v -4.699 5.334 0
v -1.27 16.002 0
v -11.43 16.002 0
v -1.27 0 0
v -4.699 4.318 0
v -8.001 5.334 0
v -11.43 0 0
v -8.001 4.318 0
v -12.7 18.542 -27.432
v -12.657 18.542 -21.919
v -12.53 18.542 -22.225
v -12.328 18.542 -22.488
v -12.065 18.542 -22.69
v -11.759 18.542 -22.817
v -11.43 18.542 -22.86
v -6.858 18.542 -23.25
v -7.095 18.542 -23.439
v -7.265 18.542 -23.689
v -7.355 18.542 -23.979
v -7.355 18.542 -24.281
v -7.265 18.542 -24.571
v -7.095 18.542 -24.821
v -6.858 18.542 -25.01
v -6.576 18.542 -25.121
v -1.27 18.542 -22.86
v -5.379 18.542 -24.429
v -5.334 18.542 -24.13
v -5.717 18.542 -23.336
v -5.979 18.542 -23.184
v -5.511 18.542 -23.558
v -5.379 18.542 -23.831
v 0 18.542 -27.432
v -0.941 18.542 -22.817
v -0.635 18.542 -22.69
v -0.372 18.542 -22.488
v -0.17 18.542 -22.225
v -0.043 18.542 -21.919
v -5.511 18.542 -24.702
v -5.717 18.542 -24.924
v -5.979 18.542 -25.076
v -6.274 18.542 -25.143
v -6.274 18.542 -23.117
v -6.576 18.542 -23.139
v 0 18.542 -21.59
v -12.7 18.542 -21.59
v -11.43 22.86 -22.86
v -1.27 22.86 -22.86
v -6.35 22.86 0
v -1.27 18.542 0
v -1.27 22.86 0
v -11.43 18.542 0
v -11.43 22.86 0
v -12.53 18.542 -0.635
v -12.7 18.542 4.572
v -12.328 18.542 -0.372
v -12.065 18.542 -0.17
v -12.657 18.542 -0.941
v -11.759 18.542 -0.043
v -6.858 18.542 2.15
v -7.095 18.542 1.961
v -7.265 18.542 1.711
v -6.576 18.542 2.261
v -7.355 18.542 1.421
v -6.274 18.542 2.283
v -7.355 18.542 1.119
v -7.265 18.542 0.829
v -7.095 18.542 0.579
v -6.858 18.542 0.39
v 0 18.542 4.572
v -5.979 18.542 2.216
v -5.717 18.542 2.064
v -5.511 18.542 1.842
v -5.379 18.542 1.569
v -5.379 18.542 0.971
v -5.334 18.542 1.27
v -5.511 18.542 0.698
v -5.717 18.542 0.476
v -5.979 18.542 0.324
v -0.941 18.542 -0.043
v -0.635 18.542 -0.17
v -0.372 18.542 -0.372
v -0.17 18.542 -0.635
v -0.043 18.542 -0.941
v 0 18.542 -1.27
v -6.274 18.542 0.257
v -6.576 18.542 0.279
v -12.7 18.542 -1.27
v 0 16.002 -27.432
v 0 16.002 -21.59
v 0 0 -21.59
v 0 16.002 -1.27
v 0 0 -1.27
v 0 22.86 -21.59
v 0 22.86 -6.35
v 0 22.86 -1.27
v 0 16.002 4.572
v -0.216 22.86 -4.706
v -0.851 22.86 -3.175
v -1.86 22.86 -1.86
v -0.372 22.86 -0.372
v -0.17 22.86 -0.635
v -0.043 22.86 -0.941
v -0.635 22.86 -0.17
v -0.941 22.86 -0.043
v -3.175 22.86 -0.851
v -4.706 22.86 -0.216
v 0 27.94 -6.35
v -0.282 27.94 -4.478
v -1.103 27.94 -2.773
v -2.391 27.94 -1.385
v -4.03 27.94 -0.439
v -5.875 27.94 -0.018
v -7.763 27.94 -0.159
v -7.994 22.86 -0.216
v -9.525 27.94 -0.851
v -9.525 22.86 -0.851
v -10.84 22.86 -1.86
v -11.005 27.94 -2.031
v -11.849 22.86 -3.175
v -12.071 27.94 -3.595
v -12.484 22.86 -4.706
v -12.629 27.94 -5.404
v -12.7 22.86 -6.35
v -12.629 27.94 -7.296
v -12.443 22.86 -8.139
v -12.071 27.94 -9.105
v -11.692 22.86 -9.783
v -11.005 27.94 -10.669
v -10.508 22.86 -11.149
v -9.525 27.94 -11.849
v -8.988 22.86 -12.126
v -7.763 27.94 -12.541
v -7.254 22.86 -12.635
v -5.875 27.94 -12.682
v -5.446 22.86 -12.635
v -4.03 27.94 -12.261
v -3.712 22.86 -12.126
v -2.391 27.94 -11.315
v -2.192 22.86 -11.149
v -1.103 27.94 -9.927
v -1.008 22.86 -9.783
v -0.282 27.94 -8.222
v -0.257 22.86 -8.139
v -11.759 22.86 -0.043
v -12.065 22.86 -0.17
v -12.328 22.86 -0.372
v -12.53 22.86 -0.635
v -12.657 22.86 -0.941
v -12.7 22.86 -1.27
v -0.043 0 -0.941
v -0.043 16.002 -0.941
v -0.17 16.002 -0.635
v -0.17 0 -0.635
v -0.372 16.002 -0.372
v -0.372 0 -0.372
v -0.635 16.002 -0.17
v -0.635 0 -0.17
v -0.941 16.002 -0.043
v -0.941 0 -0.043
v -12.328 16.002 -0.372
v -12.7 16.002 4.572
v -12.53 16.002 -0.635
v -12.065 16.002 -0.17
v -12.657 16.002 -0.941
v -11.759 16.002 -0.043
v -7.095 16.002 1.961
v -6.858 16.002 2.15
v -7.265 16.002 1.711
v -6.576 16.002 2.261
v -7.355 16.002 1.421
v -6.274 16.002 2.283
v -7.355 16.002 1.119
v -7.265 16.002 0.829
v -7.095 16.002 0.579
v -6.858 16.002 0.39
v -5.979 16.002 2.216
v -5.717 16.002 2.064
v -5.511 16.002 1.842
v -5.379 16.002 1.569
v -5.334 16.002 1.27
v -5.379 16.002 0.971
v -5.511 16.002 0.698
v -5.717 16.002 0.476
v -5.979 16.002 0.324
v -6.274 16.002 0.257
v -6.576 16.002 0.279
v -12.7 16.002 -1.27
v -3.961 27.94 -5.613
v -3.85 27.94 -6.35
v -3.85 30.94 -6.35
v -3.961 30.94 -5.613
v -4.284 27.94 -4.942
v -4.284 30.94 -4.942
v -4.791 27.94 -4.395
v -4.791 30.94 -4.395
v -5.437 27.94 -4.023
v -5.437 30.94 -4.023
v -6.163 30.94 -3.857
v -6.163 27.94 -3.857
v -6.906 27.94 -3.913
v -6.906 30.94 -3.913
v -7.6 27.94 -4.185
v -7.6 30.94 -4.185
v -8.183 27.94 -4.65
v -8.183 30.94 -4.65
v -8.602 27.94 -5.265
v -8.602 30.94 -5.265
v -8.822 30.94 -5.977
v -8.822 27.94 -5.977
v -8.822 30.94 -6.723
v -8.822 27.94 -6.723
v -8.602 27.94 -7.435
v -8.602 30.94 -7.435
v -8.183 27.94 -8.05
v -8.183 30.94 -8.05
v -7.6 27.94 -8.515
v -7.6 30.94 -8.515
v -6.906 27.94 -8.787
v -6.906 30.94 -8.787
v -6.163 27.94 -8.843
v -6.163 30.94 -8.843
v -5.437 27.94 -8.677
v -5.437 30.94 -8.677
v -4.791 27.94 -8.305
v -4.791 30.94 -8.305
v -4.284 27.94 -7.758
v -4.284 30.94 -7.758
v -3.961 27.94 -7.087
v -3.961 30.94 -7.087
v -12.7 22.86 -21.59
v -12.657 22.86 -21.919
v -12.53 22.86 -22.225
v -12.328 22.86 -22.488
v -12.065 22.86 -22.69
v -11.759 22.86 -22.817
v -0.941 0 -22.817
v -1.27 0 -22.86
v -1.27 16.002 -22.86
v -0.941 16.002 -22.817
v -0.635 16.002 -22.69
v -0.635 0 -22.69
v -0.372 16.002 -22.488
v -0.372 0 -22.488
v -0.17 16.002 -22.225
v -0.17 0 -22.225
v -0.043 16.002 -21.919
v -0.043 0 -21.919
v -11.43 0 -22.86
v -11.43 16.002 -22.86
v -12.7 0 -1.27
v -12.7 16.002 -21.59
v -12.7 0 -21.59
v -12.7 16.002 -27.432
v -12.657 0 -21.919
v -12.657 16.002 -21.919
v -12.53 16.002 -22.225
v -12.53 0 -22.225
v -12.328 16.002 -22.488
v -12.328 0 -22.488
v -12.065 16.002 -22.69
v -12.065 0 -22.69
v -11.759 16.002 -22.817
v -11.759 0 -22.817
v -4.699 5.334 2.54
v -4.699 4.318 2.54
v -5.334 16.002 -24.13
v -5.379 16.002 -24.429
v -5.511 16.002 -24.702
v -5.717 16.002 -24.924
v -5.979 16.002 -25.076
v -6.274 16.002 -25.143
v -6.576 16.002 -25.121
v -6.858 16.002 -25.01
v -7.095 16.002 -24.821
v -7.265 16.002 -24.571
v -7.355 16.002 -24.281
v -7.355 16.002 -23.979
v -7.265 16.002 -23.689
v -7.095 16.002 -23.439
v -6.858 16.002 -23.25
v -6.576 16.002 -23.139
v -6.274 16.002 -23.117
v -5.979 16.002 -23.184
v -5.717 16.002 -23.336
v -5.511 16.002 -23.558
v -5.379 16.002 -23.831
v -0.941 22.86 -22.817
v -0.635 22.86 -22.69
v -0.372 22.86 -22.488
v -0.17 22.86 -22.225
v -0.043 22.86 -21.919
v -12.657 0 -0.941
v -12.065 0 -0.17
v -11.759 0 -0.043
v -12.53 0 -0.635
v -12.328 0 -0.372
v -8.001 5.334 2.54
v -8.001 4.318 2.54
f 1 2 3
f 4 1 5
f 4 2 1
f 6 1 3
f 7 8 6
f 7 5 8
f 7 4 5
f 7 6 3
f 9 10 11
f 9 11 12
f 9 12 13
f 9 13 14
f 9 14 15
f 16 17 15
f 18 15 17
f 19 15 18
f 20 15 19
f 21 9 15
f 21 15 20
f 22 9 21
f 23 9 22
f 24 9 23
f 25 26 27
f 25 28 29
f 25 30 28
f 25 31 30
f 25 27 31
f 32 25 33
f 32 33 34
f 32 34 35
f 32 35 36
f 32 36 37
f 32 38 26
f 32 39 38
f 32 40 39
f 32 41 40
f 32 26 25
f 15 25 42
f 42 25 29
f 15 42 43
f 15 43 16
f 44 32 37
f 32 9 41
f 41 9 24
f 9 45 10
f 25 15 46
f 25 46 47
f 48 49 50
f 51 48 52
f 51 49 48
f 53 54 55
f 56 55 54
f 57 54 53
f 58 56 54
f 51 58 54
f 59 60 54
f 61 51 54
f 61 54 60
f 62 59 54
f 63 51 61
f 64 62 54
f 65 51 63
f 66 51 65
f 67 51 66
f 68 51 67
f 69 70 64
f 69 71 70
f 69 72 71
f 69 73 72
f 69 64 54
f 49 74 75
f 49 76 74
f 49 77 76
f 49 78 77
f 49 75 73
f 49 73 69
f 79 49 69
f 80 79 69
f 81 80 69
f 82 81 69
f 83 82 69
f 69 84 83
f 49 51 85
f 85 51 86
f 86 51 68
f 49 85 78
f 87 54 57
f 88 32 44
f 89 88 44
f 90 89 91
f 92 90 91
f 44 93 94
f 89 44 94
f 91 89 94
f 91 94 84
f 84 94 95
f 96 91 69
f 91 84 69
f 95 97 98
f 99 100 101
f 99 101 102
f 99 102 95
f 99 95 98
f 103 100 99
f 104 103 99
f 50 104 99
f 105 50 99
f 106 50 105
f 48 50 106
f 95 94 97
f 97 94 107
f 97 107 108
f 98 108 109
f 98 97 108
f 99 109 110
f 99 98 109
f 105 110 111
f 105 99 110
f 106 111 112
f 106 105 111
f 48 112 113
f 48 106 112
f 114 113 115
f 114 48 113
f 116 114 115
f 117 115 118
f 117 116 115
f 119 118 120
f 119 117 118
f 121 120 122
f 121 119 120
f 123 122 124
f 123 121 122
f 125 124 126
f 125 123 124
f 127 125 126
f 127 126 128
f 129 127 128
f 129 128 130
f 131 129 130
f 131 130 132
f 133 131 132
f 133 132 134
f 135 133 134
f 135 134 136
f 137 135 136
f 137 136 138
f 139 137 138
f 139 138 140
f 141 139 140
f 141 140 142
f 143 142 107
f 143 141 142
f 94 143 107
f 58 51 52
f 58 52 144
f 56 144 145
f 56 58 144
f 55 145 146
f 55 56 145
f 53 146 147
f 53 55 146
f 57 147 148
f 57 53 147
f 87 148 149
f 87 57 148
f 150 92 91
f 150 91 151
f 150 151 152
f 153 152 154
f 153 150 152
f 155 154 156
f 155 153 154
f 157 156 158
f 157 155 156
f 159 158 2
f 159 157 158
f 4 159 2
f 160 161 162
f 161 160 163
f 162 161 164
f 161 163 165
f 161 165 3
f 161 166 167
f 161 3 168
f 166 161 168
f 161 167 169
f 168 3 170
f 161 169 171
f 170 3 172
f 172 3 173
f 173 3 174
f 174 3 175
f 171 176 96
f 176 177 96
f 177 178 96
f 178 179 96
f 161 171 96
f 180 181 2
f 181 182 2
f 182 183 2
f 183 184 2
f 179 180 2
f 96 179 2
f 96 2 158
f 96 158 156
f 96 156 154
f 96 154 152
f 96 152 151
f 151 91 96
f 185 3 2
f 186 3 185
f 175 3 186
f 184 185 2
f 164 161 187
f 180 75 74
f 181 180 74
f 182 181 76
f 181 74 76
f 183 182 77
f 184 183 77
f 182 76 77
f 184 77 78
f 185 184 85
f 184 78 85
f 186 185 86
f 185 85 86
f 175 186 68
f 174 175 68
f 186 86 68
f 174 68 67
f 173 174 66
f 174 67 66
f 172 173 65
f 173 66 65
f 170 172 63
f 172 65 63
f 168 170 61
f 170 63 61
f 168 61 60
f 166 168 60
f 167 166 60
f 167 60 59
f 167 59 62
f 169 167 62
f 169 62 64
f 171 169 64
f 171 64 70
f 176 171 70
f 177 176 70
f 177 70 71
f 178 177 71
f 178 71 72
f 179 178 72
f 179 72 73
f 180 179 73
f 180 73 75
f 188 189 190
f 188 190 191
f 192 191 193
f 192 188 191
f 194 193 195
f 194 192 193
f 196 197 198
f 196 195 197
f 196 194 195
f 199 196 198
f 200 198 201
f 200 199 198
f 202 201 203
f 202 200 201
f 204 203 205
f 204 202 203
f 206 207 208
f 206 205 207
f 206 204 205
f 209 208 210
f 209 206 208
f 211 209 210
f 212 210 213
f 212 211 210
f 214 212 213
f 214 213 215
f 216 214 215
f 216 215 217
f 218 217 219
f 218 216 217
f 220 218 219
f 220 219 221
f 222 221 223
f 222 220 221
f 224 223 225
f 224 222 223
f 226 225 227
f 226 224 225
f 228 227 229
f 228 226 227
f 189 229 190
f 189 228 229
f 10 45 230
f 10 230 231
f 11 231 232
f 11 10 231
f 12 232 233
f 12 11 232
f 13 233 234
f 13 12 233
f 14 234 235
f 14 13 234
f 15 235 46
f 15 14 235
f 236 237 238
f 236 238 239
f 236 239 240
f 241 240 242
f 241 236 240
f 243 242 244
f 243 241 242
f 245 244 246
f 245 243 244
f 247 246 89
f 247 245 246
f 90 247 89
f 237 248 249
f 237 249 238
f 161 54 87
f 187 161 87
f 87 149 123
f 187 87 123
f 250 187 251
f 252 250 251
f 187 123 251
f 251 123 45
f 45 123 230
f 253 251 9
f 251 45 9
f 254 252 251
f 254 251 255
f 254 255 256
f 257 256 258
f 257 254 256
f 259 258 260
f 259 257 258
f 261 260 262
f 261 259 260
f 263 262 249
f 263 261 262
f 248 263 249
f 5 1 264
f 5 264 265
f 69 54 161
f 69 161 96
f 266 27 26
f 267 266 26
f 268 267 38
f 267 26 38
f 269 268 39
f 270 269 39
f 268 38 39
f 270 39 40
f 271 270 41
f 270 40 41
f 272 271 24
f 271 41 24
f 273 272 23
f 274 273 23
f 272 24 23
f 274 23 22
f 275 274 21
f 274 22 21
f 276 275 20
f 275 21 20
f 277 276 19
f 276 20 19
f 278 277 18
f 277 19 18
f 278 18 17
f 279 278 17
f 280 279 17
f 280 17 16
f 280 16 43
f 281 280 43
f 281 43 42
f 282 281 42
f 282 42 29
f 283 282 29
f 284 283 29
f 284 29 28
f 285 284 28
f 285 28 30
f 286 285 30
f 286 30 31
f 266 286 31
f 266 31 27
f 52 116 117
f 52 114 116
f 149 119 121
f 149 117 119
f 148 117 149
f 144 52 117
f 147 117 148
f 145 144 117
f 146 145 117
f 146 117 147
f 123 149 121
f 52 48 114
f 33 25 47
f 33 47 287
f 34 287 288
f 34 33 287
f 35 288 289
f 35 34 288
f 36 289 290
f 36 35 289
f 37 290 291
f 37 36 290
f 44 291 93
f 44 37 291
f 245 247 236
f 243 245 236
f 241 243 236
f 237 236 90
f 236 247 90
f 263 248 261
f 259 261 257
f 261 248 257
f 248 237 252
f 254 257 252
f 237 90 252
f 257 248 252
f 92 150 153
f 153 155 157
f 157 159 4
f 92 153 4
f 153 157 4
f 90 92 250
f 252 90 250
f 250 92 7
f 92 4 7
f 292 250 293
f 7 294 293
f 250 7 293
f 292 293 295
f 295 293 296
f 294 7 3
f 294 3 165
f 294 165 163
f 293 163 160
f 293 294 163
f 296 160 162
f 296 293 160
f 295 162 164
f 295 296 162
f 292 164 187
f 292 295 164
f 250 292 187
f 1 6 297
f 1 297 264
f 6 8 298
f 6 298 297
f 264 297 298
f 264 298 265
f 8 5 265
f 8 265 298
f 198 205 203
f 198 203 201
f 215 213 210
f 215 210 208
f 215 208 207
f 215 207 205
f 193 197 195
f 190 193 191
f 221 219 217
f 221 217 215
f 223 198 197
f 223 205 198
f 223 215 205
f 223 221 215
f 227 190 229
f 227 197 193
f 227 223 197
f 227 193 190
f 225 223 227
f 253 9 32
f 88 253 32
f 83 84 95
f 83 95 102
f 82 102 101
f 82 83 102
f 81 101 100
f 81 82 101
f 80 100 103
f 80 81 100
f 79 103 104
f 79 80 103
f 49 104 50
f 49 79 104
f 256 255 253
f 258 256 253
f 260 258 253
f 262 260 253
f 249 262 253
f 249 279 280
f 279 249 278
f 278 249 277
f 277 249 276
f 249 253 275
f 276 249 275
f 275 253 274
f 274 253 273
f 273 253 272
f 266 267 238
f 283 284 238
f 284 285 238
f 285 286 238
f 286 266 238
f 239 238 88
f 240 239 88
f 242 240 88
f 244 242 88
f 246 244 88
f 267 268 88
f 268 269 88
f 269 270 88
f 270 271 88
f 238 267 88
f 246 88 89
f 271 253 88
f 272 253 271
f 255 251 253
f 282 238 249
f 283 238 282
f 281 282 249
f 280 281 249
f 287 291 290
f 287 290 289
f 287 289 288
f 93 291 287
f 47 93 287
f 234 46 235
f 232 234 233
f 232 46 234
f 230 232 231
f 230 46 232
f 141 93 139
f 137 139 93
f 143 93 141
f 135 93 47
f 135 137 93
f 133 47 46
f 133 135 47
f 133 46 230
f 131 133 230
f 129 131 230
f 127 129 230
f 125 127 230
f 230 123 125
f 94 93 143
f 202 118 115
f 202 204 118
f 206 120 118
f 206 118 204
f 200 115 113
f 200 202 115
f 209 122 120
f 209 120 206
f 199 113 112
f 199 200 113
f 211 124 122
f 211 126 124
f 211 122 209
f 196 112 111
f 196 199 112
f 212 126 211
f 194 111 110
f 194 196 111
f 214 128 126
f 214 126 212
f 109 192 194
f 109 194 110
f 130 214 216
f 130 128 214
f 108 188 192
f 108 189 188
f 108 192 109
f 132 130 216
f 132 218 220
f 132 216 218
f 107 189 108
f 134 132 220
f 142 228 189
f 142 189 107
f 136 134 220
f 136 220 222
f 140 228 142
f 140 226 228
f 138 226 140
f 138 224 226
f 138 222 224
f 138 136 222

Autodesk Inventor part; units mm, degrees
ref_plane "YZ Plane" through (0, 0, 0) normal (1, 0, 0) x (0, 1, 0)
ref_plane "XZ Plane" through (0, 0, 0) normal (0, 1, 0) x (-1, 0, 0)
sketch "Sketch1" plane through (0, 0, 0) normal (0, 1, 0) x (-1, 0, 0)
  line L0 (1.27, 0) -> (11.43, 0)
  line L1 (12.7, -1.27) -> (12.7, -21.59)
  line L2 (11.43, -22.86) -> (1.27, -22.86)
  line L3 (0, -21.59) -> (0, -1.27)
  arc A0 (12.7, -1.27) -> (11.43, 0) centre (11.43, -1.27) ccw
  arc A1 (1.27, 0) -> (0, -1.27) centre (1.27, -1.27) ccw
  arc A2 (0, -21.59) -> (1.27, -22.86) centre (1.27, -21.59) ccw
  arc A3 (11.43, -22.86) -> (12.7, -21.59) centre (11.43, -21.59) ccw
  point P0 (0, 0)
  point P1 (12.7, -22.86)
  point P2 (12.7, 0)
  point P3 (0, -22.86)
  dimension "d0" = 12.7
  dimension "d1" = 22.86
  dimension "d2" = 1.27
extrude "Extrusion1" add sketch "Sketch1" along normal blind 22.86
sketch "Sketch2" plane through (0, 22.86, 0) normal (0, 1, 0) x (1, 0, 0)
  line L0 (-12.7, 21.59) -> (-12.7, 1.27) projected
  line L1 (-11.43, 0) -> (-1.27, 0) projected
  line L2 (0, 1.27) -> (0, 21.59) projected
  circle A0 centre (-6.35, 6.35) radius 6.35
  point P0 (0, 0)
extrude "Extrusion2" add sketch "Sketch2" along normal blind 5.08
ref_plane "Work Plane1" through (0, 18.542, 0) normal (0, 1, 0) x (1, 0, 0)
sketch "Sketch5" plane through (0, 18.542, 0) normal (0, 1, 0) x (1, 0, 0)
  line L0 (-12.7, 27.432) -> (0, 27.432)
  line L1 (-12.7, 21.59) -> (-12.7, 1.27) projected
  line L2 (0, 1.27) -> (0, 21.59) projected
  circle A0 centre (-6.35, 24.13) radius 1.016
  line L3 (0, 11.43) -> (-12.7, 11.43) construction
  line L4 (-12.7, -4.572) -> (0, -4.572)
  circle A1 centre (-6.35, -1.27) radius 1.016
  line L5 (-12.7, -4.572) -> (-12.7, 27.432)
  line L6 (0, 27.432) -> (0, -4.572)
  point P0 (0, 0)
  dimension "d13" = 16.002
  dimension "d14" = 2.032
  dimension "d15" = 25.4
extrude "Extrusion4" add sketch "Sketch5" against normal blind 2.54
sketch "Sketch6" plane through (-11.43, 0, 0) normal (0, 0, 1) x (1, 0, 0)
  line L0 (3.429, 5.334) -> (6.731, 5.334)
  line L1 (6.731, 5.334) -> (6.731, 4.318)
  line L2 (6.731, 4.318) -> (3.429, 4.318)
  line L3 (3.429, 4.318) -> (3.429, 5.334)
  line L4 (0, 0) -> (10.16, 0) projected
  point P0 (11.43, 0)
  point P1 (5.08, 0)
  point P2 (5.08, 4.318)
  dimension "d18" = 3.302
  dimension "d19" = 1.016
  dimension "d20" = 4.318
extrude "Extrusion5" add sketch "Sketch6" along normal blind 2.54
sketch "Sketch7" plane through (-6.35, 27.94, -6.35) normal (0, 1, 0) x (1, 0, 0)
  circle A0 centre (0, 0) radius 2.5
  point P0 (6.35, -6.35)
  dimension "d23" = 5
extrude "Extrusion6" add sketch "Sketch7" along normal blind 3
properties part number "servo (2)"
